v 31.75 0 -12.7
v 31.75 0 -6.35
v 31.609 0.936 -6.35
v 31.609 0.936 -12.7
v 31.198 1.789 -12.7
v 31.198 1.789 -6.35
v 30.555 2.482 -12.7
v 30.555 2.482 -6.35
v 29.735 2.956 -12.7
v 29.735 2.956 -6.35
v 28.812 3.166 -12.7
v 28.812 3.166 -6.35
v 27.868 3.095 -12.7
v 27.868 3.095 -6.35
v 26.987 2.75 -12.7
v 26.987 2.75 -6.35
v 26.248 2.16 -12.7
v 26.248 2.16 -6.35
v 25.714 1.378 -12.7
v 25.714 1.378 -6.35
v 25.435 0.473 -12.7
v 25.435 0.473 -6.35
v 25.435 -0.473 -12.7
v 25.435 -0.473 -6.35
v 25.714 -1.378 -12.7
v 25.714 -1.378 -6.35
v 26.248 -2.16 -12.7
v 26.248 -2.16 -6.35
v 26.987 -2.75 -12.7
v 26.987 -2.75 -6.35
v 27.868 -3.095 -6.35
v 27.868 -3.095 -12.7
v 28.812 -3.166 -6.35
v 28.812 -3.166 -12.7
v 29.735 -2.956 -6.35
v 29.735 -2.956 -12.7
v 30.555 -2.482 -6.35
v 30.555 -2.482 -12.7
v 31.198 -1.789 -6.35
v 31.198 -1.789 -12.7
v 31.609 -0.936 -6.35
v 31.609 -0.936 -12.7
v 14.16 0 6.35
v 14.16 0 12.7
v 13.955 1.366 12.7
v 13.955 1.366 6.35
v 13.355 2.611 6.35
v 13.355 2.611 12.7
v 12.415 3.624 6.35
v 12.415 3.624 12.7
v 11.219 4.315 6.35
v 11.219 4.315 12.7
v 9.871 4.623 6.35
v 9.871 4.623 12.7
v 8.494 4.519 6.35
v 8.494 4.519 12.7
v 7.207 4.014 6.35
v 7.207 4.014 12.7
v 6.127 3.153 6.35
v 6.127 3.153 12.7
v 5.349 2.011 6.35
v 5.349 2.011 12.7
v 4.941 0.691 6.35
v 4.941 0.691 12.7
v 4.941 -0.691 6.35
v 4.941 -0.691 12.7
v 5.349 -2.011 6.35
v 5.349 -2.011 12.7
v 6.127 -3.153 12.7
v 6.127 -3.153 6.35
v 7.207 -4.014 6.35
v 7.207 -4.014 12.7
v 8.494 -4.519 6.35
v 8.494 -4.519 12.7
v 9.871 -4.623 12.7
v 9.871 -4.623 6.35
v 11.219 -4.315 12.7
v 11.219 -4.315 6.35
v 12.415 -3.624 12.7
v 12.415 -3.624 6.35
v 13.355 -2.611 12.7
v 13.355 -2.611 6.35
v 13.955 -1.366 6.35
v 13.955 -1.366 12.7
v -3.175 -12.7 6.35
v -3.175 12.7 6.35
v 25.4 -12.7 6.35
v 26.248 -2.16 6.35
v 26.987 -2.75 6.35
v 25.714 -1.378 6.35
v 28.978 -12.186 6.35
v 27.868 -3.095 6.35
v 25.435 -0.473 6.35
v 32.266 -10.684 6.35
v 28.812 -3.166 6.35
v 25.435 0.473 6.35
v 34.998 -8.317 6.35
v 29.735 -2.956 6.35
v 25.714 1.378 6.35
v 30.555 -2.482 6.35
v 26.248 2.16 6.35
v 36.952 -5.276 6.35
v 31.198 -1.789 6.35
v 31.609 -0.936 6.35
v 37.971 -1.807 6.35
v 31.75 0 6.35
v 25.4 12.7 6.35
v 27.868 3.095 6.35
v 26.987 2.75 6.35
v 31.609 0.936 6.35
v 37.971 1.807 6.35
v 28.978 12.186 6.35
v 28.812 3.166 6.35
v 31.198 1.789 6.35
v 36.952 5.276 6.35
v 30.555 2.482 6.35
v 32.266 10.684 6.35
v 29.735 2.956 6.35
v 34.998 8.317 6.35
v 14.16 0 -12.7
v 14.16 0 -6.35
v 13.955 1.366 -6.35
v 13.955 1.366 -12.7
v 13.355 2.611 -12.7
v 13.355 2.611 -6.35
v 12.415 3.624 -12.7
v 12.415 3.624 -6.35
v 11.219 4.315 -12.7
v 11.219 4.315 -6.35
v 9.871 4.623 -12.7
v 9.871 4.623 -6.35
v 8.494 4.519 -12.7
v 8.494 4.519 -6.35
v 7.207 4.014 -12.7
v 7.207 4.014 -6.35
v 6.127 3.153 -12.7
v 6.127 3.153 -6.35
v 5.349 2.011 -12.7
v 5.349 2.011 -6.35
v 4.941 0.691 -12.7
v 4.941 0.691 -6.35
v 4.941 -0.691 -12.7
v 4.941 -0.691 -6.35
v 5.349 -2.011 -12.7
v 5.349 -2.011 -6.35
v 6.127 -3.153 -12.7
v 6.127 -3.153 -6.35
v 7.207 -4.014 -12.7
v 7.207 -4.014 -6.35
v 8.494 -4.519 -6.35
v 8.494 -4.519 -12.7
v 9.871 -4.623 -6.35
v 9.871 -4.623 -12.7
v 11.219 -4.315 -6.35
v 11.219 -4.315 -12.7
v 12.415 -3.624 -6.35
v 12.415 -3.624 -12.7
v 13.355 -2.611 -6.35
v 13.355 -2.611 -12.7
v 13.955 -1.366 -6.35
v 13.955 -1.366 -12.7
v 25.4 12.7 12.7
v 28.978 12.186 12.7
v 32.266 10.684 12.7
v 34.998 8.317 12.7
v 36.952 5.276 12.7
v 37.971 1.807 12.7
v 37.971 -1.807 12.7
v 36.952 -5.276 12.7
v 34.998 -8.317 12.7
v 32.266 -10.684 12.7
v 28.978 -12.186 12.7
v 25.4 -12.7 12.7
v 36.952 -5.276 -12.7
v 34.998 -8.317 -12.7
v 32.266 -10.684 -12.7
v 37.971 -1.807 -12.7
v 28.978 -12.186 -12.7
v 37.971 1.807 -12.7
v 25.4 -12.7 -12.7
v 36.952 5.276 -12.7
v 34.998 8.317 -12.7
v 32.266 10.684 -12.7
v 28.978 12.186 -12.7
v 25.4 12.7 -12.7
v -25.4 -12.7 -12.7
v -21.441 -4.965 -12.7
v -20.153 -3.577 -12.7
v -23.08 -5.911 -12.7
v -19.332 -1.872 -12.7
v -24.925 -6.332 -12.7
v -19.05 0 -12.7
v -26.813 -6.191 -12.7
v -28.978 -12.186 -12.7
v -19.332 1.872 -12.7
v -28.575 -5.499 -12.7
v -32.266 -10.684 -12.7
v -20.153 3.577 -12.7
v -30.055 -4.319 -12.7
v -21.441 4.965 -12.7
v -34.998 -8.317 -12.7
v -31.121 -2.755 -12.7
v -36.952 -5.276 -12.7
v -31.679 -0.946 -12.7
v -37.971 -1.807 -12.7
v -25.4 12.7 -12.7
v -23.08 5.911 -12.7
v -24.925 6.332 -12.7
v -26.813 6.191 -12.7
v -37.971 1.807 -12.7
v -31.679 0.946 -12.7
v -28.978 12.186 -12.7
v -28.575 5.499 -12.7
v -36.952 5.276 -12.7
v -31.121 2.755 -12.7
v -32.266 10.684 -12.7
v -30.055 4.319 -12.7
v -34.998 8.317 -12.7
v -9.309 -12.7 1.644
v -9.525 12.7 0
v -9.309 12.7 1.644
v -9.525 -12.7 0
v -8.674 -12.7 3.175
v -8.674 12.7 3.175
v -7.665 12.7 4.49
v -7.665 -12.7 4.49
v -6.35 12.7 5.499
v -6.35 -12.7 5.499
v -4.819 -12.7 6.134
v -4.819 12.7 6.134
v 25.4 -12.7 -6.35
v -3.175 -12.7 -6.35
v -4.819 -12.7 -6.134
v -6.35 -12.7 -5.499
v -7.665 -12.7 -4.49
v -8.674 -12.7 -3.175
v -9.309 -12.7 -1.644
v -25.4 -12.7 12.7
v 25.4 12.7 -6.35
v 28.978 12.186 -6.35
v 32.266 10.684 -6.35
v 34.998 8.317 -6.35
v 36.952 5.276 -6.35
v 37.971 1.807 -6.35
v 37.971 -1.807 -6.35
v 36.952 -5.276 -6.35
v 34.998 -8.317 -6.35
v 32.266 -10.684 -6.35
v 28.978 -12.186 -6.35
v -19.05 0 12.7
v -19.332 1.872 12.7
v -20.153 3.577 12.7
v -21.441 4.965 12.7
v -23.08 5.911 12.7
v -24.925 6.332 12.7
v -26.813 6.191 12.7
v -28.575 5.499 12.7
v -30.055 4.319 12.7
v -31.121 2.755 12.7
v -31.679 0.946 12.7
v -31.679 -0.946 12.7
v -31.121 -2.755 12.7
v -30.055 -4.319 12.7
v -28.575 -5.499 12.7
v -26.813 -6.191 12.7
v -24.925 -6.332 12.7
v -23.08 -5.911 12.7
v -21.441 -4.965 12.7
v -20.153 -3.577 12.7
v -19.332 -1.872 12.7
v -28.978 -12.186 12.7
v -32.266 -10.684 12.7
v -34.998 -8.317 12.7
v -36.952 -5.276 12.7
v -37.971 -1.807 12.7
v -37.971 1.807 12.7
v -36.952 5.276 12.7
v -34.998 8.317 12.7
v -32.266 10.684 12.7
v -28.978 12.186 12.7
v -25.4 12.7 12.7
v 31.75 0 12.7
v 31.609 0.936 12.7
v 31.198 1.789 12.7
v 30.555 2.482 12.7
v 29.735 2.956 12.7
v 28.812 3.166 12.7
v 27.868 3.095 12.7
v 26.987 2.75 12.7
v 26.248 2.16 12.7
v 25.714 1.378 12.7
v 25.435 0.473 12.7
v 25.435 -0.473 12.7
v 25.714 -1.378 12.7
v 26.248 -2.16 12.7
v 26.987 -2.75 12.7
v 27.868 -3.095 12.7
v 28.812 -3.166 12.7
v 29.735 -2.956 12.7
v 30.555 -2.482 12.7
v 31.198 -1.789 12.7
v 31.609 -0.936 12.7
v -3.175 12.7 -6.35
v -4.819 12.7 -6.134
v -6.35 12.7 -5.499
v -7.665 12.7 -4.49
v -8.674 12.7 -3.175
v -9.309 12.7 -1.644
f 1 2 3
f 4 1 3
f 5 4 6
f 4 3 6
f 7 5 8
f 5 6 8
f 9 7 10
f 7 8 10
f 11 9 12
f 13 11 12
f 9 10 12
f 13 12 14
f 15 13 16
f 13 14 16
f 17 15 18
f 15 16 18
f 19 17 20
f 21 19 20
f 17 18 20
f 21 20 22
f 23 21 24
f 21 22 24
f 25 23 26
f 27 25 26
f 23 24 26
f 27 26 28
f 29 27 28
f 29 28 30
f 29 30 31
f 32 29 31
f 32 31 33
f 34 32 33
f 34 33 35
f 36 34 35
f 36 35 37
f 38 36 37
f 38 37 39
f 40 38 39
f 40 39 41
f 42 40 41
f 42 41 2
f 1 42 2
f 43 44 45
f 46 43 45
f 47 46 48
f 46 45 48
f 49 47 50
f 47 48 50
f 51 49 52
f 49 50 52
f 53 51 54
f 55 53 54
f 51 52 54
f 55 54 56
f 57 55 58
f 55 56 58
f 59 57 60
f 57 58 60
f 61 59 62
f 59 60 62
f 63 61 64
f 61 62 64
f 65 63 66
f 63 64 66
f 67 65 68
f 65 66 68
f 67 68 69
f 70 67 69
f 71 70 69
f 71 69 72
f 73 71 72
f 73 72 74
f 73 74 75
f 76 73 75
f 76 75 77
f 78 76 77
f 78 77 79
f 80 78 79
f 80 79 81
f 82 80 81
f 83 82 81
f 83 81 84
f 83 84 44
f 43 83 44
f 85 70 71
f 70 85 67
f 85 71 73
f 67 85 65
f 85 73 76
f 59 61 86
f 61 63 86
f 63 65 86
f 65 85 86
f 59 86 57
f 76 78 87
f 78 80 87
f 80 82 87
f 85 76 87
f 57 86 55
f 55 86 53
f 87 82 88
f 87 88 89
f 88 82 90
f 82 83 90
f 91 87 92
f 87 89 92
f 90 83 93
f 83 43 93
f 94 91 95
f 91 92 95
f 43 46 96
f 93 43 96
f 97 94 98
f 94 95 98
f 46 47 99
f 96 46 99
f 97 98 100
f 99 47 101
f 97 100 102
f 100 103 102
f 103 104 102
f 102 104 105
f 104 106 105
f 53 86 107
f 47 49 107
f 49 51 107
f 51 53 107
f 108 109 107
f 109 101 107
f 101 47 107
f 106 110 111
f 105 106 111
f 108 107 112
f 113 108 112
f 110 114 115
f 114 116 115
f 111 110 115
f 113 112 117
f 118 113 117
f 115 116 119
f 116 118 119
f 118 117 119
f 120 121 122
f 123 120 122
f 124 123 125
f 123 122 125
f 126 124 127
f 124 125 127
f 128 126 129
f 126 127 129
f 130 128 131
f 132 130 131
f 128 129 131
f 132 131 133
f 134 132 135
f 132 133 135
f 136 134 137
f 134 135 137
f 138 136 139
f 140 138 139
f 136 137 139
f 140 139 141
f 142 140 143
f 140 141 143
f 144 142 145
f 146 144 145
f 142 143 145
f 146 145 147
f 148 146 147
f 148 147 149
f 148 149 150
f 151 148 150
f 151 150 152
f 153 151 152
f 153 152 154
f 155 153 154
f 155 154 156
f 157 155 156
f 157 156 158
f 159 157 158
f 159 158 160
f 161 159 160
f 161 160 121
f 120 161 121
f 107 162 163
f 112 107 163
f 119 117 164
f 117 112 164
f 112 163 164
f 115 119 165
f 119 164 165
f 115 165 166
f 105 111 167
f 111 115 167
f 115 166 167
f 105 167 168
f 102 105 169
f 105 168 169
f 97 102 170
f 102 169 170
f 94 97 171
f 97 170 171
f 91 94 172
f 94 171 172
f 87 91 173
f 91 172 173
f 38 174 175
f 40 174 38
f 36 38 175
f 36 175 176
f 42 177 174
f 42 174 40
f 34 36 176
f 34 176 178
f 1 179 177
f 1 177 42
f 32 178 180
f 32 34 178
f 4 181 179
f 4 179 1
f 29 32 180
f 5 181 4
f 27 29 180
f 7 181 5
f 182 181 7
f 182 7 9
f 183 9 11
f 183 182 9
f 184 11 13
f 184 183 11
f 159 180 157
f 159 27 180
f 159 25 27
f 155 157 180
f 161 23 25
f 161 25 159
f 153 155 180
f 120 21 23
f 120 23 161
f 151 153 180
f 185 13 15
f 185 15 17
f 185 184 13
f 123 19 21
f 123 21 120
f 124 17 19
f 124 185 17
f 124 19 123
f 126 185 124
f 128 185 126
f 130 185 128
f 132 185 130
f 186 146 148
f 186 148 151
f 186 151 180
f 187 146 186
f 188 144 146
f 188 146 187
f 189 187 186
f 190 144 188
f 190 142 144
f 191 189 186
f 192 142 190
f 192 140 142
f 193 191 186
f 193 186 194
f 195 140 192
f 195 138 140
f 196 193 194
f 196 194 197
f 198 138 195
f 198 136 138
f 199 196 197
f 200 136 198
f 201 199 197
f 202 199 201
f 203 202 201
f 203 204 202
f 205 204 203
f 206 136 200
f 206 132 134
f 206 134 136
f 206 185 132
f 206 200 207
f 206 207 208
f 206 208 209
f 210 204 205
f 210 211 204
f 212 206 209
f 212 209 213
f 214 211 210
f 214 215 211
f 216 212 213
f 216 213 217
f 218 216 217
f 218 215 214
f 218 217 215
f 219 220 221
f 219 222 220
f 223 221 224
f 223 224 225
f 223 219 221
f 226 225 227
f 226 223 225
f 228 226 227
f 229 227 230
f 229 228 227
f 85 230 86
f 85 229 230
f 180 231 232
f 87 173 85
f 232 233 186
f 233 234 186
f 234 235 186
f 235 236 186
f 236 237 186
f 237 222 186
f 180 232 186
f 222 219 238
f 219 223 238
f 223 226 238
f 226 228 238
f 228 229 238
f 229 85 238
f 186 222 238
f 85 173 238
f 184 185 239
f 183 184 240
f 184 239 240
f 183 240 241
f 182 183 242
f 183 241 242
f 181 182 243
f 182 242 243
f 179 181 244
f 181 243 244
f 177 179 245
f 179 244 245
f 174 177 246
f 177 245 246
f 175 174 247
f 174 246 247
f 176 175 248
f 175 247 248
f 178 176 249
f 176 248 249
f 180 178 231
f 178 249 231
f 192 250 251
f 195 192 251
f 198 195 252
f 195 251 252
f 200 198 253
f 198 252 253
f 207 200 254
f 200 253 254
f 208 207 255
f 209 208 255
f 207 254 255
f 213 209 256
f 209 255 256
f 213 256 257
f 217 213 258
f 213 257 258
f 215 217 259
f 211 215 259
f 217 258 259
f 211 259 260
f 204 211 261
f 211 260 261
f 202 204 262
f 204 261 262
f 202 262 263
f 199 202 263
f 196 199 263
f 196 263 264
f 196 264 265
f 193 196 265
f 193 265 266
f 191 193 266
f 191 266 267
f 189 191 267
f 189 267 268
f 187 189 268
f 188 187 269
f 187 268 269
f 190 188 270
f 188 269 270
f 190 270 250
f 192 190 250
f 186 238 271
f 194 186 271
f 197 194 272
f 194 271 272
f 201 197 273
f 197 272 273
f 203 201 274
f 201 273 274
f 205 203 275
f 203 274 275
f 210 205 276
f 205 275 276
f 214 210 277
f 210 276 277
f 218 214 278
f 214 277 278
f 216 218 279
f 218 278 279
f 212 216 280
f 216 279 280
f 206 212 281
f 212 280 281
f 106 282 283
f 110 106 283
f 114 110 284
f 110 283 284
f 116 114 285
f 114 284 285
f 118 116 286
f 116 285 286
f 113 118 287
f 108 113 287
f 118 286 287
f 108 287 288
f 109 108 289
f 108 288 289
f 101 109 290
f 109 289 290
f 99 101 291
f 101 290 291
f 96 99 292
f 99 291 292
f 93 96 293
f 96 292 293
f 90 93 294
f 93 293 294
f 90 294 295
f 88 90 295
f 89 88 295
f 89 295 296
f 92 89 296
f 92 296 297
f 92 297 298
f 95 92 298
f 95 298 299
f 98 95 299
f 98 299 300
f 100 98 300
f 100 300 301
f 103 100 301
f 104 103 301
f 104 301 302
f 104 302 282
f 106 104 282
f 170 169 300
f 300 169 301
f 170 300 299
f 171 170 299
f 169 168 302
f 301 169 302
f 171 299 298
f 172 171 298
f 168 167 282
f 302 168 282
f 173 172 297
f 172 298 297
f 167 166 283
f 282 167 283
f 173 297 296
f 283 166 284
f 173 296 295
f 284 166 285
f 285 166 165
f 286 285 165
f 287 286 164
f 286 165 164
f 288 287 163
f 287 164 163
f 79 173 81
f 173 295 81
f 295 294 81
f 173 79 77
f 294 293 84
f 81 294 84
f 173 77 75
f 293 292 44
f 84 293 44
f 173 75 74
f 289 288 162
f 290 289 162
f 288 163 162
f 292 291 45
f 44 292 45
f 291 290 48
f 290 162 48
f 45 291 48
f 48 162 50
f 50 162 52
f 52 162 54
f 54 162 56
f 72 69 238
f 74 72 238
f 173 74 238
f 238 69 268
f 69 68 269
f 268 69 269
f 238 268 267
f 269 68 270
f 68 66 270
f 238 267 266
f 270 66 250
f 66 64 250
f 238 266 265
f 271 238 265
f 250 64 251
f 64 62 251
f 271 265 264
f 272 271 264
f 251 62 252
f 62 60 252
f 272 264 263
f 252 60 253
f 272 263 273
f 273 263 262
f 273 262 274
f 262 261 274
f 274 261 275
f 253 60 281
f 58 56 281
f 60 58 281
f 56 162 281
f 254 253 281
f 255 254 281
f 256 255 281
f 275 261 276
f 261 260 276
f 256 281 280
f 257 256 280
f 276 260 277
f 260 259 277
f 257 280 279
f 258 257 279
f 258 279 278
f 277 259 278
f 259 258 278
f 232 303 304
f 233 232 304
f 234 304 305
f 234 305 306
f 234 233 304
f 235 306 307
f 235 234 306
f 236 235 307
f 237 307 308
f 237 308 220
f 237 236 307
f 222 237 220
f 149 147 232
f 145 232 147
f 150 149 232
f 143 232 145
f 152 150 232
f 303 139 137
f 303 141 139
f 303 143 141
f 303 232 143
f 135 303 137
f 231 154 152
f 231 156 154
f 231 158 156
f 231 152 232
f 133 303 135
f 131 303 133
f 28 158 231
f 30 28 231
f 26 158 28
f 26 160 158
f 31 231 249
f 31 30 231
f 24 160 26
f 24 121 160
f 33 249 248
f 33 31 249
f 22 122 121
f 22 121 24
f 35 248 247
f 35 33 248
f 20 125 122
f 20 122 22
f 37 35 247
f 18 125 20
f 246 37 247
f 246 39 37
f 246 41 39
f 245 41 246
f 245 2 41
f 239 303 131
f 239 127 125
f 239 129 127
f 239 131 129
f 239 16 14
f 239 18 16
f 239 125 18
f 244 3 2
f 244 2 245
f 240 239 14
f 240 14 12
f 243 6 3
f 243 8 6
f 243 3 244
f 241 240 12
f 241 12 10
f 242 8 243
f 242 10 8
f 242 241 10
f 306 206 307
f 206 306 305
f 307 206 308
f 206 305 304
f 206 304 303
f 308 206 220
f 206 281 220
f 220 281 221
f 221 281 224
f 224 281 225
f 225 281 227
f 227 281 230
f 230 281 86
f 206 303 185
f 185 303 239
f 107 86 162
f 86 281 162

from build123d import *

# Parameters (mm, degrees)
BOSS_EXTRUDE1_DEPTH = 12.7
SKETCH2_R           = 3.175
SKETCH2_R_2         = 4.6355
SKETCH2_R_3         = 6.35
CUT_EXTRUDE1_DEPTH  = 25.4
SKETCH3_W           = 47.625
SKETCH3_H           = 12.7
CUT_EXTRUDE2_DEPTH  = 25.4
FILLET1_R           = 6.35


with BuildPart() as part:
    # Sketch1 → Boss-Extrude1 (new, symmetric)
    with BuildSketch(Plane.XY):
        with BuildLine():
            Line((-25.4, 12.7), (25.4, 12.7))
            ThreePointArc((25.4, 12.7), (38.1, 0), (25.4, -12.7))
            Line((25.4, -12.7), (-25.4, -12.7))
            ThreePointArc((-25.4, -12.7), (-38.1, 0), (-25.4, 12.7))
        make_face()
    extrude(amount=BOSS_EXTRUDE1_DEPTH, both=True)

    # Sketch2 → Cut-Extrude1 (cut)
    with BuildSketch(Plane.XY.offset(12.7)):
        with Locations((28.575, 0)):
            Circle(SKETCH2_R)
        with Locations((9.525, 0)):
            Circle(SKETCH2_R_2)
        with Locations((-25.4, 0)):
            Circle(SKETCH2_R_3)
    extrude(amount=-CUT_EXTRUDE1_DEPTH, mode=Mode.SUBTRACT)

    # Sketch3 → Cut-Extrude2 (cut)
    with BuildSketch(Plane(origin=(0, 12.7, 0), x_dir=(1, 0, 0), z_dir=(0, 1, 0))):
        with Locations((14.2875, 0)):
            Rectangle(SKETCH3_W, SKETCH3_H)
    extrude(amount=-CUT_EXTRUDE2_DEPTH, mode=Mode.SUBTRACT)

    # Fillet1
    fillet1_edges = [part.edges().sort_by_distance(p)[0] for p in [
        (-9.525, 0, -6.35),
        (-9.525, 0, 6.35),
    ]]
    fillet(fillet1_edges, radius=FILLET1_R - 0.0001)  # a hair under: the kernel refuses the full size


solid = part.part
